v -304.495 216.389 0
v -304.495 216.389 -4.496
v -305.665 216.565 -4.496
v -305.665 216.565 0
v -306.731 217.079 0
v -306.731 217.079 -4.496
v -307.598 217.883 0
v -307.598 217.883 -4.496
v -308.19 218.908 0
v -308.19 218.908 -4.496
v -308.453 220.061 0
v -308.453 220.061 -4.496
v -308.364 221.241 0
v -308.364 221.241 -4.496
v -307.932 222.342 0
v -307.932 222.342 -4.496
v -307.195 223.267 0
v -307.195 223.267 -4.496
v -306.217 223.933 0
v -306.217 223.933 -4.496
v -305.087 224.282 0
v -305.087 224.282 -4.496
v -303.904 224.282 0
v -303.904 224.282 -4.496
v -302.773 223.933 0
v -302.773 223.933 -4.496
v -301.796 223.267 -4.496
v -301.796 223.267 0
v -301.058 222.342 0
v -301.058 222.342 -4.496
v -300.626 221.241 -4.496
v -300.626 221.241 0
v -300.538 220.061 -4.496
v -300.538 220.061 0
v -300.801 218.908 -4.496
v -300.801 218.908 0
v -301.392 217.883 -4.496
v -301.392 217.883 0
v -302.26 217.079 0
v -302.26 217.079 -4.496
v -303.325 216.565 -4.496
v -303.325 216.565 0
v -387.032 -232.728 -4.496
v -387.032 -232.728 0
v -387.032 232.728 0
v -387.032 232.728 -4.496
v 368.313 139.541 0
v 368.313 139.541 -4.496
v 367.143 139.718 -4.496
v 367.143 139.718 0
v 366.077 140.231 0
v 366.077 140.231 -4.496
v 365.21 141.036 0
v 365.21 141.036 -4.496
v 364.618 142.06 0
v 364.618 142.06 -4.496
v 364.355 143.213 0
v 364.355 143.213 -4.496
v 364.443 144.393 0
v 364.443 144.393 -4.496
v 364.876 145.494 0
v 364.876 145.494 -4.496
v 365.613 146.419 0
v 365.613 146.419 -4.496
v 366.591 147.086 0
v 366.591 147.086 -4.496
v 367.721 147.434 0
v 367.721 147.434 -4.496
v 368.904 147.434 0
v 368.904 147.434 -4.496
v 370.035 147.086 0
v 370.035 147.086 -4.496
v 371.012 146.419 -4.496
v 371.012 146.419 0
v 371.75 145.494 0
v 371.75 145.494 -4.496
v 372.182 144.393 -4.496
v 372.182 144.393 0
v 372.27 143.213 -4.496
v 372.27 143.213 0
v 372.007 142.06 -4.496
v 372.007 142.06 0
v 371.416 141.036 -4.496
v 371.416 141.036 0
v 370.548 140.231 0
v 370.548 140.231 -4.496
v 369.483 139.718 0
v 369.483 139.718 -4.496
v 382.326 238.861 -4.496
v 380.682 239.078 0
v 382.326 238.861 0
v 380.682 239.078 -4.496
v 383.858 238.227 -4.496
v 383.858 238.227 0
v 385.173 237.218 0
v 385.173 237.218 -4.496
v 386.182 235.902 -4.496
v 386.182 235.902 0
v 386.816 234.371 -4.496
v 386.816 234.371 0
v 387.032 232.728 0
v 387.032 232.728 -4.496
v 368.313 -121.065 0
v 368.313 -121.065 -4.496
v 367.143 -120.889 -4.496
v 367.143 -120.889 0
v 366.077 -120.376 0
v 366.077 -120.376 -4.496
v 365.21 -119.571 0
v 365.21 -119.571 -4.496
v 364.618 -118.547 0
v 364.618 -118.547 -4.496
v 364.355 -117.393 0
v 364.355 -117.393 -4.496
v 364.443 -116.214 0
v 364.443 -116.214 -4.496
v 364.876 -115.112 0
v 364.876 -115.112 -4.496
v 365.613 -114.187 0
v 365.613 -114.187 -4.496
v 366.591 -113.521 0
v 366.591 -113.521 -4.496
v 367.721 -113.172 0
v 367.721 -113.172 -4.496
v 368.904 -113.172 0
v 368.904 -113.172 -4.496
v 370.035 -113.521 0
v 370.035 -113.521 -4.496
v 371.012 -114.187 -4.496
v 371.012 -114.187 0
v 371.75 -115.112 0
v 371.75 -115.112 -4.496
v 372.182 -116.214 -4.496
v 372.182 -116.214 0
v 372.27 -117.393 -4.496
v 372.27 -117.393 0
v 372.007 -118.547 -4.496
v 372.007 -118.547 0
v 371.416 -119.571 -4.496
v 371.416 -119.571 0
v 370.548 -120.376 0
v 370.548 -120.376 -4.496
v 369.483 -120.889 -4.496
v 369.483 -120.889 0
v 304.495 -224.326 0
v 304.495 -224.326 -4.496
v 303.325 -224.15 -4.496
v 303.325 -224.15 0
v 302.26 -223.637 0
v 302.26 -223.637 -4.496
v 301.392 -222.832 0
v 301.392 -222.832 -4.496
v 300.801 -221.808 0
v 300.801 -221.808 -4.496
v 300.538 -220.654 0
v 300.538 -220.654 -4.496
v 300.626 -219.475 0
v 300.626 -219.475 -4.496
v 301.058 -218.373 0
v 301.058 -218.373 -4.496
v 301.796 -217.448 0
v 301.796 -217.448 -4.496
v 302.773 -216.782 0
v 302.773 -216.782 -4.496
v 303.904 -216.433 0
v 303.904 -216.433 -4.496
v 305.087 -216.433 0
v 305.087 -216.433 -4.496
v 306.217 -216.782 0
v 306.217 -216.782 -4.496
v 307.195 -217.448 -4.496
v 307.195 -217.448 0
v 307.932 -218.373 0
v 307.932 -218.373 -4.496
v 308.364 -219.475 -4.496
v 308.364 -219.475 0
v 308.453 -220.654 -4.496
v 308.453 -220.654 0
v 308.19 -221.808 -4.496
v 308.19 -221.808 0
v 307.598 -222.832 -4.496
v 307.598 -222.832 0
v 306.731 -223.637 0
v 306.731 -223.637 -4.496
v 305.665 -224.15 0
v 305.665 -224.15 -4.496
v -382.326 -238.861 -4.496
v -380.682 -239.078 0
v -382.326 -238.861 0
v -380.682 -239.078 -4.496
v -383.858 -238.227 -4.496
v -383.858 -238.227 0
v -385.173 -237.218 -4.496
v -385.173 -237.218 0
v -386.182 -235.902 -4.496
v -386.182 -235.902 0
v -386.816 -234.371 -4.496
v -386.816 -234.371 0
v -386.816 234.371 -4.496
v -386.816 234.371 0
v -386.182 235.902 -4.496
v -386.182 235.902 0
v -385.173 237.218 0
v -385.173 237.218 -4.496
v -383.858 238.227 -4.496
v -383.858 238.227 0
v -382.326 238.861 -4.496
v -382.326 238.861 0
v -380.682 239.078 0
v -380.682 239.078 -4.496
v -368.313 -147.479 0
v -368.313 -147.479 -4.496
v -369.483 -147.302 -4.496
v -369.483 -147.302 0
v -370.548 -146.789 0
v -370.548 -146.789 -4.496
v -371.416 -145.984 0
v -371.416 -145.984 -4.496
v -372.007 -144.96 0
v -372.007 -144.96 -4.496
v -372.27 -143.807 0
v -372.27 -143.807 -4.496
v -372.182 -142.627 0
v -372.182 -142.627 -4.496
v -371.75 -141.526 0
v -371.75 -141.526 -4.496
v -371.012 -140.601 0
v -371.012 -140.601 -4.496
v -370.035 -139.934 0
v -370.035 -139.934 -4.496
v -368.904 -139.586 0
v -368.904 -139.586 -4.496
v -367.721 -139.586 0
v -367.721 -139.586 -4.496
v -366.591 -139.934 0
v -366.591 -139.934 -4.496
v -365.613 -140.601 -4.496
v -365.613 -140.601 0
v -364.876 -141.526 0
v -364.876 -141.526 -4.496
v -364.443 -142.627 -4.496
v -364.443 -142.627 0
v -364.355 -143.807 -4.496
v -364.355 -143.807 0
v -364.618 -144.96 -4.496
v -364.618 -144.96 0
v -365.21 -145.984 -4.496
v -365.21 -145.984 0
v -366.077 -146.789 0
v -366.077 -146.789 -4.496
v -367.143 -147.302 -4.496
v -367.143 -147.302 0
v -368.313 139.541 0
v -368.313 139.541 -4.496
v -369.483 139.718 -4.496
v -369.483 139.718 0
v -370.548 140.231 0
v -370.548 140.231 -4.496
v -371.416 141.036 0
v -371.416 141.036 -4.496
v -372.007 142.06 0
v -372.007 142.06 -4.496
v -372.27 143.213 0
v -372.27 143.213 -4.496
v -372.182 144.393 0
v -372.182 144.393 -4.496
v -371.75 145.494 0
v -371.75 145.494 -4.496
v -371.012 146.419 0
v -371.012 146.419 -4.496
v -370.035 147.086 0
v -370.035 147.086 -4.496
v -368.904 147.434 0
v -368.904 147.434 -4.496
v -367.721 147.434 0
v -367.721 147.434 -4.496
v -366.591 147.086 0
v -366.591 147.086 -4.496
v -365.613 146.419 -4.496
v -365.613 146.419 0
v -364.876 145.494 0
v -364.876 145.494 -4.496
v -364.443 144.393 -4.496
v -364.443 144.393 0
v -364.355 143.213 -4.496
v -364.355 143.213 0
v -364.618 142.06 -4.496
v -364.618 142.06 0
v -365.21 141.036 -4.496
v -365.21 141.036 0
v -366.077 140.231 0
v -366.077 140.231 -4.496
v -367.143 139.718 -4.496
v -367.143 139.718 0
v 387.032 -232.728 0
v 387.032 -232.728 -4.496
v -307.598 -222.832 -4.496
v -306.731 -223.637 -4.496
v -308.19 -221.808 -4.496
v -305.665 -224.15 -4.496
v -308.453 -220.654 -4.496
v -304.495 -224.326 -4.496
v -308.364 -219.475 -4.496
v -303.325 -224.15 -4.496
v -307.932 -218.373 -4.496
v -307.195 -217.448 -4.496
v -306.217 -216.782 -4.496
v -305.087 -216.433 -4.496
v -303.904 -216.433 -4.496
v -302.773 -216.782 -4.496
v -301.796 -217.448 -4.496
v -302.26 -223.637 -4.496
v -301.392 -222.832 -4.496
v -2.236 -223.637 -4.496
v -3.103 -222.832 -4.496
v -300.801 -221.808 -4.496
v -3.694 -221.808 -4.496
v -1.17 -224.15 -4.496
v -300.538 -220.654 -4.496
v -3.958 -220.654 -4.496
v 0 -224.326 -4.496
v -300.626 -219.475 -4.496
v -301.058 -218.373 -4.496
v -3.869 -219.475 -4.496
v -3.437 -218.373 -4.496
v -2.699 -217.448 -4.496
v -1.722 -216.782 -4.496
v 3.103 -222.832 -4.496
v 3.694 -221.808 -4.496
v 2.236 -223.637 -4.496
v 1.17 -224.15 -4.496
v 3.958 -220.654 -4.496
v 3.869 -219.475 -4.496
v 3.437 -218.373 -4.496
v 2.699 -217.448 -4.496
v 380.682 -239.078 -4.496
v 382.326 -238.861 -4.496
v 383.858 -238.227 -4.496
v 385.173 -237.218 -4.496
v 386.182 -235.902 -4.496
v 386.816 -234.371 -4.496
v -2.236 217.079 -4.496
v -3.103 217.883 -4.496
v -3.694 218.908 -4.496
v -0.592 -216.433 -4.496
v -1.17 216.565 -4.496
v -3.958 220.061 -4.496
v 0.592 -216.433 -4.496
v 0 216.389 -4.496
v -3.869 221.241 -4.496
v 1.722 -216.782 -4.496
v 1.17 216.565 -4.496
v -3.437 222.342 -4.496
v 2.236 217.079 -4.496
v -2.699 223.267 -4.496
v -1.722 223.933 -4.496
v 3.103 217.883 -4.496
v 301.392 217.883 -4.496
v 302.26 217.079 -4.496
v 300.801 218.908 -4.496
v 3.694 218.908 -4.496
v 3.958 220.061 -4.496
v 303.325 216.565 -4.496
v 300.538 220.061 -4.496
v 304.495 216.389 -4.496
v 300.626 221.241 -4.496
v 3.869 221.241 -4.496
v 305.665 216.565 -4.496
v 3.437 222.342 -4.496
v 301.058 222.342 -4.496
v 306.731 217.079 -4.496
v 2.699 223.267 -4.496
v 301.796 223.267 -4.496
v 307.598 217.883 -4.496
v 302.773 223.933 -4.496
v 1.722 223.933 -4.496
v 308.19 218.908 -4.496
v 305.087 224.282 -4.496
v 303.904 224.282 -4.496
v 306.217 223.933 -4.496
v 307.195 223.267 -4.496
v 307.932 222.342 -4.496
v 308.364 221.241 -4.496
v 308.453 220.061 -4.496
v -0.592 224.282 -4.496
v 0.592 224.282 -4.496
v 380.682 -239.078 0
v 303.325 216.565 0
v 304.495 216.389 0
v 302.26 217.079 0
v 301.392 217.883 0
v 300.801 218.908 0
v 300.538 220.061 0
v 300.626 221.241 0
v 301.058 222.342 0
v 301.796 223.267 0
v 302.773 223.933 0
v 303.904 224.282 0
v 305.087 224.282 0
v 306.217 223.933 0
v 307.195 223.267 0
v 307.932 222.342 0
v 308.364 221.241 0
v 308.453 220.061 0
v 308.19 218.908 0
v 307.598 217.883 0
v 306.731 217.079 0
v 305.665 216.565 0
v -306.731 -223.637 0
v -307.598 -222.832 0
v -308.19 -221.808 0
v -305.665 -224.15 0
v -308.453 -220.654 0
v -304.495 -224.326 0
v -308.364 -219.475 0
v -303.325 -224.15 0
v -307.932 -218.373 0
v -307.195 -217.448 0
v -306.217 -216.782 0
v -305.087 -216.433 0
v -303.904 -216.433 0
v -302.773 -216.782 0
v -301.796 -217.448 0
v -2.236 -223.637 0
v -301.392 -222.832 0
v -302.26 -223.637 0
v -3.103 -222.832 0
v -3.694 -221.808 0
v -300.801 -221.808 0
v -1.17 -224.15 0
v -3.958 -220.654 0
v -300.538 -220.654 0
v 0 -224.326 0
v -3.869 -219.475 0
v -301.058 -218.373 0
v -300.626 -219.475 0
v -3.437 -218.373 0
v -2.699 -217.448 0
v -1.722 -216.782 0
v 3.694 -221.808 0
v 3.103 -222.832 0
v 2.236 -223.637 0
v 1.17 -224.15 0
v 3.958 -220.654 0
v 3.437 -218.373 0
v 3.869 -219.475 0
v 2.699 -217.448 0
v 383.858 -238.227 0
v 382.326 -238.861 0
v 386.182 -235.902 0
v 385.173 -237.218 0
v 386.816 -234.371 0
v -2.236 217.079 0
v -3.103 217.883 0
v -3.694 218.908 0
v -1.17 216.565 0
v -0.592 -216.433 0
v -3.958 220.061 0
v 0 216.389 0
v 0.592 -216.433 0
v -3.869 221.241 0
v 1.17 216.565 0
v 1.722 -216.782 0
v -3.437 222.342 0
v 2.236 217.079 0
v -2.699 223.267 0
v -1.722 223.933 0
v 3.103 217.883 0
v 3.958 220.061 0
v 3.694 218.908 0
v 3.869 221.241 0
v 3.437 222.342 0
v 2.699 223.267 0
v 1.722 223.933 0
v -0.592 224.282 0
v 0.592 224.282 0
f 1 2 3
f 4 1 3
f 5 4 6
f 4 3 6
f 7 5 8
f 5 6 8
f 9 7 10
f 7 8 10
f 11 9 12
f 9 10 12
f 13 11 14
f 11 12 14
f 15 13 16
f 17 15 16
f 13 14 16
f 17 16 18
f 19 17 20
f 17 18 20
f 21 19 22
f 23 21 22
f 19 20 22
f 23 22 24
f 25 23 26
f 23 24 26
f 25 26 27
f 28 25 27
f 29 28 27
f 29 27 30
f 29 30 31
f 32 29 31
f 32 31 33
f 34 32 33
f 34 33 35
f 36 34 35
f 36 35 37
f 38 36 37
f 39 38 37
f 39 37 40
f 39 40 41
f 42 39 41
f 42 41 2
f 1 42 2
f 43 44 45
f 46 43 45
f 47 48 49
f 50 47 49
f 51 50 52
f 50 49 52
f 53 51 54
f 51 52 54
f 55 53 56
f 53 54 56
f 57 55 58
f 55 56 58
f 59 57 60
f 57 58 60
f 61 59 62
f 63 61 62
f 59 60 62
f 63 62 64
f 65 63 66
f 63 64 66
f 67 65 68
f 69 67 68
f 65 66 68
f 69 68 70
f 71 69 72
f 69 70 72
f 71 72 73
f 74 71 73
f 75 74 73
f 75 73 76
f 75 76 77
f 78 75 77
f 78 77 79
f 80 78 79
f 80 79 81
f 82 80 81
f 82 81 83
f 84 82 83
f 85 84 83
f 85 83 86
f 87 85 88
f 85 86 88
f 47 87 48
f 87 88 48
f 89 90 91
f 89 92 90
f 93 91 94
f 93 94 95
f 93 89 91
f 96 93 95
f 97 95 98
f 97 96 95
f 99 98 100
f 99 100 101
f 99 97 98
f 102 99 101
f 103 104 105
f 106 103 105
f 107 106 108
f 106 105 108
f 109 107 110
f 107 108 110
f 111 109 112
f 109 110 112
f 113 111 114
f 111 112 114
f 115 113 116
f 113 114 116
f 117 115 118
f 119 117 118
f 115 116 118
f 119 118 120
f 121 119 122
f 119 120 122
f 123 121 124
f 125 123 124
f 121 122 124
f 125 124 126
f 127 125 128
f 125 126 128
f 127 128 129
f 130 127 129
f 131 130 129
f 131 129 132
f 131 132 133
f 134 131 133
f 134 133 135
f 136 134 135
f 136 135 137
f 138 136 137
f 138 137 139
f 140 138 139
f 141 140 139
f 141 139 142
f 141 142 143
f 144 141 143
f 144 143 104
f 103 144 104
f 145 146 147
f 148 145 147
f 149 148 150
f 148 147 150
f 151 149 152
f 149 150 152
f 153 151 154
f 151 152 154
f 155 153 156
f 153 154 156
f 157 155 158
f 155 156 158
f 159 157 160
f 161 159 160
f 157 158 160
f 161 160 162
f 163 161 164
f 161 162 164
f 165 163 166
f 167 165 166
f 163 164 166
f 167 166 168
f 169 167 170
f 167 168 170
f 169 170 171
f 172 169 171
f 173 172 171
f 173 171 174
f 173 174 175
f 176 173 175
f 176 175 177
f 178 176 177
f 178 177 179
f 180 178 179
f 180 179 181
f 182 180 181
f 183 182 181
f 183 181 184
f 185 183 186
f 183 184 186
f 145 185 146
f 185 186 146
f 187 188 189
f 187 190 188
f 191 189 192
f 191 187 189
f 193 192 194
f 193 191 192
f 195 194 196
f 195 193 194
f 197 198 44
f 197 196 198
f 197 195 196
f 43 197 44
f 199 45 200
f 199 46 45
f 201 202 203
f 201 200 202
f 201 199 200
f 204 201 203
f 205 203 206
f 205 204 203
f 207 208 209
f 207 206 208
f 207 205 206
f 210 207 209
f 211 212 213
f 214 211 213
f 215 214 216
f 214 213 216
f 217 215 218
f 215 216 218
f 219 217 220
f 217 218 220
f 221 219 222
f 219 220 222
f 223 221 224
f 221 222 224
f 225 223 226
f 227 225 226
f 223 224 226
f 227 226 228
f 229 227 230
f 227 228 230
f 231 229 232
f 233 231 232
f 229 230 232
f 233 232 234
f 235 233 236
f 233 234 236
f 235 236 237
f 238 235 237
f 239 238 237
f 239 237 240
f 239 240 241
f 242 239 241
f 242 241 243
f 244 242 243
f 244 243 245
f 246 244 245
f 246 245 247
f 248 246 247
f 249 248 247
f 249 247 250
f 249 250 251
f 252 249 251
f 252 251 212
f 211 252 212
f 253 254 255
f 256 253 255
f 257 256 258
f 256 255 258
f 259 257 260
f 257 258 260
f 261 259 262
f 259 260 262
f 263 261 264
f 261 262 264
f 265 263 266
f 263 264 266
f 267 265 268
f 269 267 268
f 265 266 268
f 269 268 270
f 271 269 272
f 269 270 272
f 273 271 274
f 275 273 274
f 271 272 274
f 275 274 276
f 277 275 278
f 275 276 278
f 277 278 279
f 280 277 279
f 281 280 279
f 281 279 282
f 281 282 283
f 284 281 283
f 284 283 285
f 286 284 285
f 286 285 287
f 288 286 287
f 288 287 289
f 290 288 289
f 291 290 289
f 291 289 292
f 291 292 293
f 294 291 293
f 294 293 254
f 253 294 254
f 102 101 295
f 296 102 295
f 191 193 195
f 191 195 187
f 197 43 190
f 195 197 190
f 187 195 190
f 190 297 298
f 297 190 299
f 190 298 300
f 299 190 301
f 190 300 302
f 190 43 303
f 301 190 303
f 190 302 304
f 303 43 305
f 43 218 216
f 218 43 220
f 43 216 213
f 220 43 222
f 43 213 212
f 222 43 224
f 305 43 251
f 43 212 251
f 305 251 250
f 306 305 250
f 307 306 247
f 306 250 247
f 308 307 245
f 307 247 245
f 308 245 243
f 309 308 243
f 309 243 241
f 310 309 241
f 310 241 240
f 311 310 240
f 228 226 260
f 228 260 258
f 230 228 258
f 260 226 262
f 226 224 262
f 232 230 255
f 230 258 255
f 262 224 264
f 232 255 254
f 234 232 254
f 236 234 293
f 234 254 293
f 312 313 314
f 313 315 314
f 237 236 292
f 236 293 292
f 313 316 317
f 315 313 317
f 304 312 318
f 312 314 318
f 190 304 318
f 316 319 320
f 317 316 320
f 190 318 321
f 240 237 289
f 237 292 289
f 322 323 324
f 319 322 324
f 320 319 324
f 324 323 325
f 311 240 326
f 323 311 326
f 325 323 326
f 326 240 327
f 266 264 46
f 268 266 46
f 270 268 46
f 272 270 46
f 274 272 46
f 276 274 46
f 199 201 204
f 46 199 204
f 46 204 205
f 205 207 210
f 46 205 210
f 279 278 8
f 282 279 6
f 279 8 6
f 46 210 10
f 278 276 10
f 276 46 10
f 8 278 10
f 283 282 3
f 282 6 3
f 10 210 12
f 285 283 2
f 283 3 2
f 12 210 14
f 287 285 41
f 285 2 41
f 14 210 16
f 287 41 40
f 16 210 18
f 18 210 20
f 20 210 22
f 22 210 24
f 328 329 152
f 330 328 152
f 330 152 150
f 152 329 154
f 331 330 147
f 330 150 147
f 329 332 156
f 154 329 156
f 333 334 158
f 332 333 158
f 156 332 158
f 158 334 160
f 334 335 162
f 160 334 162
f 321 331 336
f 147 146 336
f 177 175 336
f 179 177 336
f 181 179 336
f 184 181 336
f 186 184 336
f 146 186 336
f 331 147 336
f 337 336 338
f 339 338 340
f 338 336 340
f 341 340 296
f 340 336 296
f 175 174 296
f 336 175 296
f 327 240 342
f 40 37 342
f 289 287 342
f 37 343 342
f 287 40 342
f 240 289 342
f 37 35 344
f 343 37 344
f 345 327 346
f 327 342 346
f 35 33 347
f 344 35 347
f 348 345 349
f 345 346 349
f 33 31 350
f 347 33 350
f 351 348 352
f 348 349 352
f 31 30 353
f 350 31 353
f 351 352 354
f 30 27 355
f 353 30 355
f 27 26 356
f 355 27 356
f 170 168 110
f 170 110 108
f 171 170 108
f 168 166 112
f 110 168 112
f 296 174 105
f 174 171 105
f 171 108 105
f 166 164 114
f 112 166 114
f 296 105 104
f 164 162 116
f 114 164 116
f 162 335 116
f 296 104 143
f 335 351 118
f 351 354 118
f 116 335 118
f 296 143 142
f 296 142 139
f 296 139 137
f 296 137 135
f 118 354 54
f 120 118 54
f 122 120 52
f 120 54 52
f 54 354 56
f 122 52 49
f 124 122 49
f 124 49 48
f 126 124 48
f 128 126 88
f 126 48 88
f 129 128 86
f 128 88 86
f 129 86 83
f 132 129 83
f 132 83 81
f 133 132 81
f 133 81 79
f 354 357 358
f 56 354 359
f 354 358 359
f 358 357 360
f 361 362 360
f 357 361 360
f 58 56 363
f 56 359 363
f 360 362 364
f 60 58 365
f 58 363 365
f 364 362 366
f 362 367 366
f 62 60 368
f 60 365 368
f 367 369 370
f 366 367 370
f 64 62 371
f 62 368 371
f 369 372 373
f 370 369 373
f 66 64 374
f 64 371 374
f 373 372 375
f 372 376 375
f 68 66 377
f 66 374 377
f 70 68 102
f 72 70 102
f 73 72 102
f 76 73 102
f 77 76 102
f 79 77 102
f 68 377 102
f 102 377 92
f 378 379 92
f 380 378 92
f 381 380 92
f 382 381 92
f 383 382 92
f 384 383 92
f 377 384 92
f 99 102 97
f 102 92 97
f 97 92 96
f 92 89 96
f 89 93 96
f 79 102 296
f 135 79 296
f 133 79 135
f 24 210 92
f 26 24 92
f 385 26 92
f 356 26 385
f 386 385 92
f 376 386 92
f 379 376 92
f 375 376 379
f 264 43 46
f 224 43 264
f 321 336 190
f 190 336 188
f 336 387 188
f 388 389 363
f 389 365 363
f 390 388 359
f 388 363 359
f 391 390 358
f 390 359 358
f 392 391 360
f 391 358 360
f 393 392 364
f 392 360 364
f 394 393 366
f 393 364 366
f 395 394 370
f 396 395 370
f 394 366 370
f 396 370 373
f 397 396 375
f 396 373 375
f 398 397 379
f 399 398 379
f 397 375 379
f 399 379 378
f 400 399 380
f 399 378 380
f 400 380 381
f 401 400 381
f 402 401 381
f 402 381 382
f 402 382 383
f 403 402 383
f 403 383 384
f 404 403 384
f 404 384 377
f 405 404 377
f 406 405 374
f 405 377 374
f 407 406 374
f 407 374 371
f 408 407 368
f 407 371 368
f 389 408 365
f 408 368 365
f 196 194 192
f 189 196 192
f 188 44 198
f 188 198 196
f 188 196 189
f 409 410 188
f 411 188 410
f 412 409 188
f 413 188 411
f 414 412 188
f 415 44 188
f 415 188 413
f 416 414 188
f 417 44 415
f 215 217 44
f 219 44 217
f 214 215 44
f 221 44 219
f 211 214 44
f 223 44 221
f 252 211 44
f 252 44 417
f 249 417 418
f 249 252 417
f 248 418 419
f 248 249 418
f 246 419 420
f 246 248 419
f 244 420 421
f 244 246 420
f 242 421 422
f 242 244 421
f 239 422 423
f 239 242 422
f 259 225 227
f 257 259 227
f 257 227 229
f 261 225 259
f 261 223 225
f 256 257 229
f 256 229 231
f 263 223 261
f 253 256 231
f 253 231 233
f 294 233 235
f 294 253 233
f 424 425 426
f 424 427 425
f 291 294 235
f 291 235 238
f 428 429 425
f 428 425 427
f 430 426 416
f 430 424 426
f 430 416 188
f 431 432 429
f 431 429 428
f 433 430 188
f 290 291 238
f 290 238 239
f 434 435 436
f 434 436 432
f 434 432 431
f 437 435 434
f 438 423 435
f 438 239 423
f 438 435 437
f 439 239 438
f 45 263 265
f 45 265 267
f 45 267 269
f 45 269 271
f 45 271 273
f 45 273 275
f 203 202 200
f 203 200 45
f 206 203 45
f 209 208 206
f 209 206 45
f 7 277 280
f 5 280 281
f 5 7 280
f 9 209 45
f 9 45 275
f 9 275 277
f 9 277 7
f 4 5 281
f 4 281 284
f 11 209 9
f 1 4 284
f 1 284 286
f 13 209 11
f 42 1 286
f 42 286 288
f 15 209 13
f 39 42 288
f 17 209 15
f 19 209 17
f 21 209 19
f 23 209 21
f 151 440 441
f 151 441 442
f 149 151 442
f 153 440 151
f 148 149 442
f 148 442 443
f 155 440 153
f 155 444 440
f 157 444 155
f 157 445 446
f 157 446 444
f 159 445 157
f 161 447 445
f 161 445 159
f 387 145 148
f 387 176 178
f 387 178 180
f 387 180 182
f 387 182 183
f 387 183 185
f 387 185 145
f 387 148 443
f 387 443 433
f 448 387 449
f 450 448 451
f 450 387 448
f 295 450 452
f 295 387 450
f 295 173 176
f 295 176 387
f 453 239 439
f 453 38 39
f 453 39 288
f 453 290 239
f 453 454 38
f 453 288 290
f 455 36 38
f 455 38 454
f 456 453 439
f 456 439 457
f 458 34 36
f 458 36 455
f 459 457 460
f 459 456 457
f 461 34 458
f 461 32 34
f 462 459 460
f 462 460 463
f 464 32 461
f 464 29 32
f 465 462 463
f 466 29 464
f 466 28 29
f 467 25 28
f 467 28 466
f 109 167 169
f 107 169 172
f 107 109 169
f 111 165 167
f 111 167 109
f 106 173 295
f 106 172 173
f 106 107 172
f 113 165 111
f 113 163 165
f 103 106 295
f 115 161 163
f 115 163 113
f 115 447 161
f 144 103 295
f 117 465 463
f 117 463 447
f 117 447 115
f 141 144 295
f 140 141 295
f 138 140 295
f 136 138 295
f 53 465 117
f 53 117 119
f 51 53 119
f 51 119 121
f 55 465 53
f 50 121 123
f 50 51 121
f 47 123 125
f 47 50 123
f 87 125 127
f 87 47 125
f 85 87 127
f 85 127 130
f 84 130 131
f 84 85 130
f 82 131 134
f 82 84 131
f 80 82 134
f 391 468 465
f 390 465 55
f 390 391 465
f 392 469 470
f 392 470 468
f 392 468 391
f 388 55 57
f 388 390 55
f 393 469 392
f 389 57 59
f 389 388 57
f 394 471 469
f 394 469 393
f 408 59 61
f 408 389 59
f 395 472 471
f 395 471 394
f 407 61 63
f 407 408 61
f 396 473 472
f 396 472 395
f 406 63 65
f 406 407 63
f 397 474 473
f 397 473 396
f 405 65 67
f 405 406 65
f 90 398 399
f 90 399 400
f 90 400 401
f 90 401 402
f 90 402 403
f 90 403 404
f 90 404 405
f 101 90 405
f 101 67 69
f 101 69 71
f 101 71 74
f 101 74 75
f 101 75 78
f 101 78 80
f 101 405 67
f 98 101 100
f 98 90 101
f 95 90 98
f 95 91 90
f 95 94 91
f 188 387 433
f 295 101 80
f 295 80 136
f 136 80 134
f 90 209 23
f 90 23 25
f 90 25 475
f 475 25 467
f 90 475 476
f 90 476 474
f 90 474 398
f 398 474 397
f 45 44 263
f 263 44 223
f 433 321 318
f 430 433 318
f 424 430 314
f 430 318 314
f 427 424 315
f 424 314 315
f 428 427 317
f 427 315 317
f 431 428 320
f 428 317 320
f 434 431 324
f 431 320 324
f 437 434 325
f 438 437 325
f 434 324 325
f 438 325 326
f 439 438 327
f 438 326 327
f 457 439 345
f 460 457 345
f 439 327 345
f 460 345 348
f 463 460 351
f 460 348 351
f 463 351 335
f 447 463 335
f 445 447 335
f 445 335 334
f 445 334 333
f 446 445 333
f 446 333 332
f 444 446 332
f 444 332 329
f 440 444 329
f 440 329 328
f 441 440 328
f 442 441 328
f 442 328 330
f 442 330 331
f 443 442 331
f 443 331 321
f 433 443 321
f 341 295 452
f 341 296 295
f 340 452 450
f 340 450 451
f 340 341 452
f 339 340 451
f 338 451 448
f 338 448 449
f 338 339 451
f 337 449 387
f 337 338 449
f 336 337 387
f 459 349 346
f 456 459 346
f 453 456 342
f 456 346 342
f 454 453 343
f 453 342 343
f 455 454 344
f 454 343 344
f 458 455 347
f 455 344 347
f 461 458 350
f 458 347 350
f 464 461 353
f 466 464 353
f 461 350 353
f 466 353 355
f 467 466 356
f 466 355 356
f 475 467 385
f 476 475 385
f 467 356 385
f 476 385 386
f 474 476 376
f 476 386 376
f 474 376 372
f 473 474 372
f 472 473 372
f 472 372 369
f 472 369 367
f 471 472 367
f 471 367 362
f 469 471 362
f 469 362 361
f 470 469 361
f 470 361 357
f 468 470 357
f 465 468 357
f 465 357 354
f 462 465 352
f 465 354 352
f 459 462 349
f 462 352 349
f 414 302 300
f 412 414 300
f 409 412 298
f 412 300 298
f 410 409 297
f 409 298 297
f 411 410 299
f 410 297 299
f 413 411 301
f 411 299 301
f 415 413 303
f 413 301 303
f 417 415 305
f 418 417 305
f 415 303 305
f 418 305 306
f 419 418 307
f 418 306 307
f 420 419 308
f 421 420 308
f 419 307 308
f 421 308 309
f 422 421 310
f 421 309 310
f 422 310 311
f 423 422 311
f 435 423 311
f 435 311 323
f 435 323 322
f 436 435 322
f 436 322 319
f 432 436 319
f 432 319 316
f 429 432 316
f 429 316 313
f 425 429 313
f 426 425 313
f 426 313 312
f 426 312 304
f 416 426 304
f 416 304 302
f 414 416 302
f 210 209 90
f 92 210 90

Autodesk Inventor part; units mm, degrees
ref_plane "YZ Plane" through (0, 0, 0) normal (1, 0, 0) x (0, 1, 0)
ref_plane "XZ Plane" through (0, 0, 0) normal (0, 1, 0) x (-1, 0, 0)
ref_plane "XY Plane" through (0, 0, 0) normal (0, 0, 1) x (1, 0, 0)
sketch "Sketch1" plane through (0, 0, 0) normal (0, 0, 1) x (1, 0, 0)
  line L0 (0, 334.7085) -> (0, -334.7085) projected
  line L1 (-541.8455, 0) -> (541.8455, 0) projected
  line L2 (387.0325, -239.0775) -> (-387.0325, -239.0775)
  line L3 (-387.0325, -239.0775) -> (-387.0325, 239.0775)
  line L4 (-387.0325, 239.0775) -> (387.0325, 239.0775)
  line L5 (387.0325, 239.0775) -> (387.0325, -239.0775)
  line L6 (387.0325, -239.0775) -> (-387.0325, 239.0775) construction
  line L7 (-387.0325, -239.0775) -> (387.0325, 239.0775) construction
  line L8 (368.3127, -220.3577) -> (-368.3127, -220.3577) construction
  line L9 (-368.3127, -220.3577) -> (-368.3127, 220.3577) construction
  line L10 (-368.3127, 220.3577) -> (368.3127, 220.3577) construction
  line L11 (368.3127, 220.3577) -> (368.3127, -220.3577) construction
  line L12 (368.3127, -220.3577) -> (-368.3127, 220.3577) construction
  line L13 (-368.3127, -220.3577) -> (368.3127, 220.3577) construction
  point P0 (0, 0)
  point P1 (-304.4952, 220.3577)
  point P2 (0, 220.3577)
  point P3 (304.4952, 220.3577)
  point P4 (-304.4952, -220.3577)
  point P5 (0, -220.3577)
  point P6 (304.4952, -220.3577)
  point P7 (-368.3127, 143.51)
  point P8 (-368.3127, -143.51)
  point P9 (368.3127, 143.51)
  point P10 (368.3127, -117.0967)
  dimension "d0" = 774.065
  dimension "d1" = 478.155
  dimension "d3" = 18.7198
  dimension "d4" = 18.7198
  dimension "d5" = 304.4952
  dimension "d6" = 304.4952
  dimension "d7" = 143.51
  dimension "d8" = 143.51
  dimension "d9" = 82.5373
  dimension "d10" = 95.5675
extrude "Extrusion1" add sketch "Sketch1" against normal blind 4.4958
hole "Hole1" at (-304.4952, 220.3577, 0) at (0, 220.3577, 0) at (304.4952, 220.3577, 0) at (-304.4952, -220.3577, 0) at (0, -220.3577, 0) at (304.4952, -220.3577, 0) at (-368.3127, 143.51, 0) at (-368.3127, -143.51, 0) at (368.3127, 143.51, 0) at (368.3127, -117.0967, 0) direction (0, 0, -1) diameter 7.9375 end through all
fillet "Fillet1" radius 6.35 4 edges at (387.0325, 239.0775, -2.2479) (387.0325, -239.0775, -2.2479) (-387.0325, -239.0775, -2.2479) (-387.0325, 239.0775, -2.2479)
properties material "ACRYLIC, CLEAR"
